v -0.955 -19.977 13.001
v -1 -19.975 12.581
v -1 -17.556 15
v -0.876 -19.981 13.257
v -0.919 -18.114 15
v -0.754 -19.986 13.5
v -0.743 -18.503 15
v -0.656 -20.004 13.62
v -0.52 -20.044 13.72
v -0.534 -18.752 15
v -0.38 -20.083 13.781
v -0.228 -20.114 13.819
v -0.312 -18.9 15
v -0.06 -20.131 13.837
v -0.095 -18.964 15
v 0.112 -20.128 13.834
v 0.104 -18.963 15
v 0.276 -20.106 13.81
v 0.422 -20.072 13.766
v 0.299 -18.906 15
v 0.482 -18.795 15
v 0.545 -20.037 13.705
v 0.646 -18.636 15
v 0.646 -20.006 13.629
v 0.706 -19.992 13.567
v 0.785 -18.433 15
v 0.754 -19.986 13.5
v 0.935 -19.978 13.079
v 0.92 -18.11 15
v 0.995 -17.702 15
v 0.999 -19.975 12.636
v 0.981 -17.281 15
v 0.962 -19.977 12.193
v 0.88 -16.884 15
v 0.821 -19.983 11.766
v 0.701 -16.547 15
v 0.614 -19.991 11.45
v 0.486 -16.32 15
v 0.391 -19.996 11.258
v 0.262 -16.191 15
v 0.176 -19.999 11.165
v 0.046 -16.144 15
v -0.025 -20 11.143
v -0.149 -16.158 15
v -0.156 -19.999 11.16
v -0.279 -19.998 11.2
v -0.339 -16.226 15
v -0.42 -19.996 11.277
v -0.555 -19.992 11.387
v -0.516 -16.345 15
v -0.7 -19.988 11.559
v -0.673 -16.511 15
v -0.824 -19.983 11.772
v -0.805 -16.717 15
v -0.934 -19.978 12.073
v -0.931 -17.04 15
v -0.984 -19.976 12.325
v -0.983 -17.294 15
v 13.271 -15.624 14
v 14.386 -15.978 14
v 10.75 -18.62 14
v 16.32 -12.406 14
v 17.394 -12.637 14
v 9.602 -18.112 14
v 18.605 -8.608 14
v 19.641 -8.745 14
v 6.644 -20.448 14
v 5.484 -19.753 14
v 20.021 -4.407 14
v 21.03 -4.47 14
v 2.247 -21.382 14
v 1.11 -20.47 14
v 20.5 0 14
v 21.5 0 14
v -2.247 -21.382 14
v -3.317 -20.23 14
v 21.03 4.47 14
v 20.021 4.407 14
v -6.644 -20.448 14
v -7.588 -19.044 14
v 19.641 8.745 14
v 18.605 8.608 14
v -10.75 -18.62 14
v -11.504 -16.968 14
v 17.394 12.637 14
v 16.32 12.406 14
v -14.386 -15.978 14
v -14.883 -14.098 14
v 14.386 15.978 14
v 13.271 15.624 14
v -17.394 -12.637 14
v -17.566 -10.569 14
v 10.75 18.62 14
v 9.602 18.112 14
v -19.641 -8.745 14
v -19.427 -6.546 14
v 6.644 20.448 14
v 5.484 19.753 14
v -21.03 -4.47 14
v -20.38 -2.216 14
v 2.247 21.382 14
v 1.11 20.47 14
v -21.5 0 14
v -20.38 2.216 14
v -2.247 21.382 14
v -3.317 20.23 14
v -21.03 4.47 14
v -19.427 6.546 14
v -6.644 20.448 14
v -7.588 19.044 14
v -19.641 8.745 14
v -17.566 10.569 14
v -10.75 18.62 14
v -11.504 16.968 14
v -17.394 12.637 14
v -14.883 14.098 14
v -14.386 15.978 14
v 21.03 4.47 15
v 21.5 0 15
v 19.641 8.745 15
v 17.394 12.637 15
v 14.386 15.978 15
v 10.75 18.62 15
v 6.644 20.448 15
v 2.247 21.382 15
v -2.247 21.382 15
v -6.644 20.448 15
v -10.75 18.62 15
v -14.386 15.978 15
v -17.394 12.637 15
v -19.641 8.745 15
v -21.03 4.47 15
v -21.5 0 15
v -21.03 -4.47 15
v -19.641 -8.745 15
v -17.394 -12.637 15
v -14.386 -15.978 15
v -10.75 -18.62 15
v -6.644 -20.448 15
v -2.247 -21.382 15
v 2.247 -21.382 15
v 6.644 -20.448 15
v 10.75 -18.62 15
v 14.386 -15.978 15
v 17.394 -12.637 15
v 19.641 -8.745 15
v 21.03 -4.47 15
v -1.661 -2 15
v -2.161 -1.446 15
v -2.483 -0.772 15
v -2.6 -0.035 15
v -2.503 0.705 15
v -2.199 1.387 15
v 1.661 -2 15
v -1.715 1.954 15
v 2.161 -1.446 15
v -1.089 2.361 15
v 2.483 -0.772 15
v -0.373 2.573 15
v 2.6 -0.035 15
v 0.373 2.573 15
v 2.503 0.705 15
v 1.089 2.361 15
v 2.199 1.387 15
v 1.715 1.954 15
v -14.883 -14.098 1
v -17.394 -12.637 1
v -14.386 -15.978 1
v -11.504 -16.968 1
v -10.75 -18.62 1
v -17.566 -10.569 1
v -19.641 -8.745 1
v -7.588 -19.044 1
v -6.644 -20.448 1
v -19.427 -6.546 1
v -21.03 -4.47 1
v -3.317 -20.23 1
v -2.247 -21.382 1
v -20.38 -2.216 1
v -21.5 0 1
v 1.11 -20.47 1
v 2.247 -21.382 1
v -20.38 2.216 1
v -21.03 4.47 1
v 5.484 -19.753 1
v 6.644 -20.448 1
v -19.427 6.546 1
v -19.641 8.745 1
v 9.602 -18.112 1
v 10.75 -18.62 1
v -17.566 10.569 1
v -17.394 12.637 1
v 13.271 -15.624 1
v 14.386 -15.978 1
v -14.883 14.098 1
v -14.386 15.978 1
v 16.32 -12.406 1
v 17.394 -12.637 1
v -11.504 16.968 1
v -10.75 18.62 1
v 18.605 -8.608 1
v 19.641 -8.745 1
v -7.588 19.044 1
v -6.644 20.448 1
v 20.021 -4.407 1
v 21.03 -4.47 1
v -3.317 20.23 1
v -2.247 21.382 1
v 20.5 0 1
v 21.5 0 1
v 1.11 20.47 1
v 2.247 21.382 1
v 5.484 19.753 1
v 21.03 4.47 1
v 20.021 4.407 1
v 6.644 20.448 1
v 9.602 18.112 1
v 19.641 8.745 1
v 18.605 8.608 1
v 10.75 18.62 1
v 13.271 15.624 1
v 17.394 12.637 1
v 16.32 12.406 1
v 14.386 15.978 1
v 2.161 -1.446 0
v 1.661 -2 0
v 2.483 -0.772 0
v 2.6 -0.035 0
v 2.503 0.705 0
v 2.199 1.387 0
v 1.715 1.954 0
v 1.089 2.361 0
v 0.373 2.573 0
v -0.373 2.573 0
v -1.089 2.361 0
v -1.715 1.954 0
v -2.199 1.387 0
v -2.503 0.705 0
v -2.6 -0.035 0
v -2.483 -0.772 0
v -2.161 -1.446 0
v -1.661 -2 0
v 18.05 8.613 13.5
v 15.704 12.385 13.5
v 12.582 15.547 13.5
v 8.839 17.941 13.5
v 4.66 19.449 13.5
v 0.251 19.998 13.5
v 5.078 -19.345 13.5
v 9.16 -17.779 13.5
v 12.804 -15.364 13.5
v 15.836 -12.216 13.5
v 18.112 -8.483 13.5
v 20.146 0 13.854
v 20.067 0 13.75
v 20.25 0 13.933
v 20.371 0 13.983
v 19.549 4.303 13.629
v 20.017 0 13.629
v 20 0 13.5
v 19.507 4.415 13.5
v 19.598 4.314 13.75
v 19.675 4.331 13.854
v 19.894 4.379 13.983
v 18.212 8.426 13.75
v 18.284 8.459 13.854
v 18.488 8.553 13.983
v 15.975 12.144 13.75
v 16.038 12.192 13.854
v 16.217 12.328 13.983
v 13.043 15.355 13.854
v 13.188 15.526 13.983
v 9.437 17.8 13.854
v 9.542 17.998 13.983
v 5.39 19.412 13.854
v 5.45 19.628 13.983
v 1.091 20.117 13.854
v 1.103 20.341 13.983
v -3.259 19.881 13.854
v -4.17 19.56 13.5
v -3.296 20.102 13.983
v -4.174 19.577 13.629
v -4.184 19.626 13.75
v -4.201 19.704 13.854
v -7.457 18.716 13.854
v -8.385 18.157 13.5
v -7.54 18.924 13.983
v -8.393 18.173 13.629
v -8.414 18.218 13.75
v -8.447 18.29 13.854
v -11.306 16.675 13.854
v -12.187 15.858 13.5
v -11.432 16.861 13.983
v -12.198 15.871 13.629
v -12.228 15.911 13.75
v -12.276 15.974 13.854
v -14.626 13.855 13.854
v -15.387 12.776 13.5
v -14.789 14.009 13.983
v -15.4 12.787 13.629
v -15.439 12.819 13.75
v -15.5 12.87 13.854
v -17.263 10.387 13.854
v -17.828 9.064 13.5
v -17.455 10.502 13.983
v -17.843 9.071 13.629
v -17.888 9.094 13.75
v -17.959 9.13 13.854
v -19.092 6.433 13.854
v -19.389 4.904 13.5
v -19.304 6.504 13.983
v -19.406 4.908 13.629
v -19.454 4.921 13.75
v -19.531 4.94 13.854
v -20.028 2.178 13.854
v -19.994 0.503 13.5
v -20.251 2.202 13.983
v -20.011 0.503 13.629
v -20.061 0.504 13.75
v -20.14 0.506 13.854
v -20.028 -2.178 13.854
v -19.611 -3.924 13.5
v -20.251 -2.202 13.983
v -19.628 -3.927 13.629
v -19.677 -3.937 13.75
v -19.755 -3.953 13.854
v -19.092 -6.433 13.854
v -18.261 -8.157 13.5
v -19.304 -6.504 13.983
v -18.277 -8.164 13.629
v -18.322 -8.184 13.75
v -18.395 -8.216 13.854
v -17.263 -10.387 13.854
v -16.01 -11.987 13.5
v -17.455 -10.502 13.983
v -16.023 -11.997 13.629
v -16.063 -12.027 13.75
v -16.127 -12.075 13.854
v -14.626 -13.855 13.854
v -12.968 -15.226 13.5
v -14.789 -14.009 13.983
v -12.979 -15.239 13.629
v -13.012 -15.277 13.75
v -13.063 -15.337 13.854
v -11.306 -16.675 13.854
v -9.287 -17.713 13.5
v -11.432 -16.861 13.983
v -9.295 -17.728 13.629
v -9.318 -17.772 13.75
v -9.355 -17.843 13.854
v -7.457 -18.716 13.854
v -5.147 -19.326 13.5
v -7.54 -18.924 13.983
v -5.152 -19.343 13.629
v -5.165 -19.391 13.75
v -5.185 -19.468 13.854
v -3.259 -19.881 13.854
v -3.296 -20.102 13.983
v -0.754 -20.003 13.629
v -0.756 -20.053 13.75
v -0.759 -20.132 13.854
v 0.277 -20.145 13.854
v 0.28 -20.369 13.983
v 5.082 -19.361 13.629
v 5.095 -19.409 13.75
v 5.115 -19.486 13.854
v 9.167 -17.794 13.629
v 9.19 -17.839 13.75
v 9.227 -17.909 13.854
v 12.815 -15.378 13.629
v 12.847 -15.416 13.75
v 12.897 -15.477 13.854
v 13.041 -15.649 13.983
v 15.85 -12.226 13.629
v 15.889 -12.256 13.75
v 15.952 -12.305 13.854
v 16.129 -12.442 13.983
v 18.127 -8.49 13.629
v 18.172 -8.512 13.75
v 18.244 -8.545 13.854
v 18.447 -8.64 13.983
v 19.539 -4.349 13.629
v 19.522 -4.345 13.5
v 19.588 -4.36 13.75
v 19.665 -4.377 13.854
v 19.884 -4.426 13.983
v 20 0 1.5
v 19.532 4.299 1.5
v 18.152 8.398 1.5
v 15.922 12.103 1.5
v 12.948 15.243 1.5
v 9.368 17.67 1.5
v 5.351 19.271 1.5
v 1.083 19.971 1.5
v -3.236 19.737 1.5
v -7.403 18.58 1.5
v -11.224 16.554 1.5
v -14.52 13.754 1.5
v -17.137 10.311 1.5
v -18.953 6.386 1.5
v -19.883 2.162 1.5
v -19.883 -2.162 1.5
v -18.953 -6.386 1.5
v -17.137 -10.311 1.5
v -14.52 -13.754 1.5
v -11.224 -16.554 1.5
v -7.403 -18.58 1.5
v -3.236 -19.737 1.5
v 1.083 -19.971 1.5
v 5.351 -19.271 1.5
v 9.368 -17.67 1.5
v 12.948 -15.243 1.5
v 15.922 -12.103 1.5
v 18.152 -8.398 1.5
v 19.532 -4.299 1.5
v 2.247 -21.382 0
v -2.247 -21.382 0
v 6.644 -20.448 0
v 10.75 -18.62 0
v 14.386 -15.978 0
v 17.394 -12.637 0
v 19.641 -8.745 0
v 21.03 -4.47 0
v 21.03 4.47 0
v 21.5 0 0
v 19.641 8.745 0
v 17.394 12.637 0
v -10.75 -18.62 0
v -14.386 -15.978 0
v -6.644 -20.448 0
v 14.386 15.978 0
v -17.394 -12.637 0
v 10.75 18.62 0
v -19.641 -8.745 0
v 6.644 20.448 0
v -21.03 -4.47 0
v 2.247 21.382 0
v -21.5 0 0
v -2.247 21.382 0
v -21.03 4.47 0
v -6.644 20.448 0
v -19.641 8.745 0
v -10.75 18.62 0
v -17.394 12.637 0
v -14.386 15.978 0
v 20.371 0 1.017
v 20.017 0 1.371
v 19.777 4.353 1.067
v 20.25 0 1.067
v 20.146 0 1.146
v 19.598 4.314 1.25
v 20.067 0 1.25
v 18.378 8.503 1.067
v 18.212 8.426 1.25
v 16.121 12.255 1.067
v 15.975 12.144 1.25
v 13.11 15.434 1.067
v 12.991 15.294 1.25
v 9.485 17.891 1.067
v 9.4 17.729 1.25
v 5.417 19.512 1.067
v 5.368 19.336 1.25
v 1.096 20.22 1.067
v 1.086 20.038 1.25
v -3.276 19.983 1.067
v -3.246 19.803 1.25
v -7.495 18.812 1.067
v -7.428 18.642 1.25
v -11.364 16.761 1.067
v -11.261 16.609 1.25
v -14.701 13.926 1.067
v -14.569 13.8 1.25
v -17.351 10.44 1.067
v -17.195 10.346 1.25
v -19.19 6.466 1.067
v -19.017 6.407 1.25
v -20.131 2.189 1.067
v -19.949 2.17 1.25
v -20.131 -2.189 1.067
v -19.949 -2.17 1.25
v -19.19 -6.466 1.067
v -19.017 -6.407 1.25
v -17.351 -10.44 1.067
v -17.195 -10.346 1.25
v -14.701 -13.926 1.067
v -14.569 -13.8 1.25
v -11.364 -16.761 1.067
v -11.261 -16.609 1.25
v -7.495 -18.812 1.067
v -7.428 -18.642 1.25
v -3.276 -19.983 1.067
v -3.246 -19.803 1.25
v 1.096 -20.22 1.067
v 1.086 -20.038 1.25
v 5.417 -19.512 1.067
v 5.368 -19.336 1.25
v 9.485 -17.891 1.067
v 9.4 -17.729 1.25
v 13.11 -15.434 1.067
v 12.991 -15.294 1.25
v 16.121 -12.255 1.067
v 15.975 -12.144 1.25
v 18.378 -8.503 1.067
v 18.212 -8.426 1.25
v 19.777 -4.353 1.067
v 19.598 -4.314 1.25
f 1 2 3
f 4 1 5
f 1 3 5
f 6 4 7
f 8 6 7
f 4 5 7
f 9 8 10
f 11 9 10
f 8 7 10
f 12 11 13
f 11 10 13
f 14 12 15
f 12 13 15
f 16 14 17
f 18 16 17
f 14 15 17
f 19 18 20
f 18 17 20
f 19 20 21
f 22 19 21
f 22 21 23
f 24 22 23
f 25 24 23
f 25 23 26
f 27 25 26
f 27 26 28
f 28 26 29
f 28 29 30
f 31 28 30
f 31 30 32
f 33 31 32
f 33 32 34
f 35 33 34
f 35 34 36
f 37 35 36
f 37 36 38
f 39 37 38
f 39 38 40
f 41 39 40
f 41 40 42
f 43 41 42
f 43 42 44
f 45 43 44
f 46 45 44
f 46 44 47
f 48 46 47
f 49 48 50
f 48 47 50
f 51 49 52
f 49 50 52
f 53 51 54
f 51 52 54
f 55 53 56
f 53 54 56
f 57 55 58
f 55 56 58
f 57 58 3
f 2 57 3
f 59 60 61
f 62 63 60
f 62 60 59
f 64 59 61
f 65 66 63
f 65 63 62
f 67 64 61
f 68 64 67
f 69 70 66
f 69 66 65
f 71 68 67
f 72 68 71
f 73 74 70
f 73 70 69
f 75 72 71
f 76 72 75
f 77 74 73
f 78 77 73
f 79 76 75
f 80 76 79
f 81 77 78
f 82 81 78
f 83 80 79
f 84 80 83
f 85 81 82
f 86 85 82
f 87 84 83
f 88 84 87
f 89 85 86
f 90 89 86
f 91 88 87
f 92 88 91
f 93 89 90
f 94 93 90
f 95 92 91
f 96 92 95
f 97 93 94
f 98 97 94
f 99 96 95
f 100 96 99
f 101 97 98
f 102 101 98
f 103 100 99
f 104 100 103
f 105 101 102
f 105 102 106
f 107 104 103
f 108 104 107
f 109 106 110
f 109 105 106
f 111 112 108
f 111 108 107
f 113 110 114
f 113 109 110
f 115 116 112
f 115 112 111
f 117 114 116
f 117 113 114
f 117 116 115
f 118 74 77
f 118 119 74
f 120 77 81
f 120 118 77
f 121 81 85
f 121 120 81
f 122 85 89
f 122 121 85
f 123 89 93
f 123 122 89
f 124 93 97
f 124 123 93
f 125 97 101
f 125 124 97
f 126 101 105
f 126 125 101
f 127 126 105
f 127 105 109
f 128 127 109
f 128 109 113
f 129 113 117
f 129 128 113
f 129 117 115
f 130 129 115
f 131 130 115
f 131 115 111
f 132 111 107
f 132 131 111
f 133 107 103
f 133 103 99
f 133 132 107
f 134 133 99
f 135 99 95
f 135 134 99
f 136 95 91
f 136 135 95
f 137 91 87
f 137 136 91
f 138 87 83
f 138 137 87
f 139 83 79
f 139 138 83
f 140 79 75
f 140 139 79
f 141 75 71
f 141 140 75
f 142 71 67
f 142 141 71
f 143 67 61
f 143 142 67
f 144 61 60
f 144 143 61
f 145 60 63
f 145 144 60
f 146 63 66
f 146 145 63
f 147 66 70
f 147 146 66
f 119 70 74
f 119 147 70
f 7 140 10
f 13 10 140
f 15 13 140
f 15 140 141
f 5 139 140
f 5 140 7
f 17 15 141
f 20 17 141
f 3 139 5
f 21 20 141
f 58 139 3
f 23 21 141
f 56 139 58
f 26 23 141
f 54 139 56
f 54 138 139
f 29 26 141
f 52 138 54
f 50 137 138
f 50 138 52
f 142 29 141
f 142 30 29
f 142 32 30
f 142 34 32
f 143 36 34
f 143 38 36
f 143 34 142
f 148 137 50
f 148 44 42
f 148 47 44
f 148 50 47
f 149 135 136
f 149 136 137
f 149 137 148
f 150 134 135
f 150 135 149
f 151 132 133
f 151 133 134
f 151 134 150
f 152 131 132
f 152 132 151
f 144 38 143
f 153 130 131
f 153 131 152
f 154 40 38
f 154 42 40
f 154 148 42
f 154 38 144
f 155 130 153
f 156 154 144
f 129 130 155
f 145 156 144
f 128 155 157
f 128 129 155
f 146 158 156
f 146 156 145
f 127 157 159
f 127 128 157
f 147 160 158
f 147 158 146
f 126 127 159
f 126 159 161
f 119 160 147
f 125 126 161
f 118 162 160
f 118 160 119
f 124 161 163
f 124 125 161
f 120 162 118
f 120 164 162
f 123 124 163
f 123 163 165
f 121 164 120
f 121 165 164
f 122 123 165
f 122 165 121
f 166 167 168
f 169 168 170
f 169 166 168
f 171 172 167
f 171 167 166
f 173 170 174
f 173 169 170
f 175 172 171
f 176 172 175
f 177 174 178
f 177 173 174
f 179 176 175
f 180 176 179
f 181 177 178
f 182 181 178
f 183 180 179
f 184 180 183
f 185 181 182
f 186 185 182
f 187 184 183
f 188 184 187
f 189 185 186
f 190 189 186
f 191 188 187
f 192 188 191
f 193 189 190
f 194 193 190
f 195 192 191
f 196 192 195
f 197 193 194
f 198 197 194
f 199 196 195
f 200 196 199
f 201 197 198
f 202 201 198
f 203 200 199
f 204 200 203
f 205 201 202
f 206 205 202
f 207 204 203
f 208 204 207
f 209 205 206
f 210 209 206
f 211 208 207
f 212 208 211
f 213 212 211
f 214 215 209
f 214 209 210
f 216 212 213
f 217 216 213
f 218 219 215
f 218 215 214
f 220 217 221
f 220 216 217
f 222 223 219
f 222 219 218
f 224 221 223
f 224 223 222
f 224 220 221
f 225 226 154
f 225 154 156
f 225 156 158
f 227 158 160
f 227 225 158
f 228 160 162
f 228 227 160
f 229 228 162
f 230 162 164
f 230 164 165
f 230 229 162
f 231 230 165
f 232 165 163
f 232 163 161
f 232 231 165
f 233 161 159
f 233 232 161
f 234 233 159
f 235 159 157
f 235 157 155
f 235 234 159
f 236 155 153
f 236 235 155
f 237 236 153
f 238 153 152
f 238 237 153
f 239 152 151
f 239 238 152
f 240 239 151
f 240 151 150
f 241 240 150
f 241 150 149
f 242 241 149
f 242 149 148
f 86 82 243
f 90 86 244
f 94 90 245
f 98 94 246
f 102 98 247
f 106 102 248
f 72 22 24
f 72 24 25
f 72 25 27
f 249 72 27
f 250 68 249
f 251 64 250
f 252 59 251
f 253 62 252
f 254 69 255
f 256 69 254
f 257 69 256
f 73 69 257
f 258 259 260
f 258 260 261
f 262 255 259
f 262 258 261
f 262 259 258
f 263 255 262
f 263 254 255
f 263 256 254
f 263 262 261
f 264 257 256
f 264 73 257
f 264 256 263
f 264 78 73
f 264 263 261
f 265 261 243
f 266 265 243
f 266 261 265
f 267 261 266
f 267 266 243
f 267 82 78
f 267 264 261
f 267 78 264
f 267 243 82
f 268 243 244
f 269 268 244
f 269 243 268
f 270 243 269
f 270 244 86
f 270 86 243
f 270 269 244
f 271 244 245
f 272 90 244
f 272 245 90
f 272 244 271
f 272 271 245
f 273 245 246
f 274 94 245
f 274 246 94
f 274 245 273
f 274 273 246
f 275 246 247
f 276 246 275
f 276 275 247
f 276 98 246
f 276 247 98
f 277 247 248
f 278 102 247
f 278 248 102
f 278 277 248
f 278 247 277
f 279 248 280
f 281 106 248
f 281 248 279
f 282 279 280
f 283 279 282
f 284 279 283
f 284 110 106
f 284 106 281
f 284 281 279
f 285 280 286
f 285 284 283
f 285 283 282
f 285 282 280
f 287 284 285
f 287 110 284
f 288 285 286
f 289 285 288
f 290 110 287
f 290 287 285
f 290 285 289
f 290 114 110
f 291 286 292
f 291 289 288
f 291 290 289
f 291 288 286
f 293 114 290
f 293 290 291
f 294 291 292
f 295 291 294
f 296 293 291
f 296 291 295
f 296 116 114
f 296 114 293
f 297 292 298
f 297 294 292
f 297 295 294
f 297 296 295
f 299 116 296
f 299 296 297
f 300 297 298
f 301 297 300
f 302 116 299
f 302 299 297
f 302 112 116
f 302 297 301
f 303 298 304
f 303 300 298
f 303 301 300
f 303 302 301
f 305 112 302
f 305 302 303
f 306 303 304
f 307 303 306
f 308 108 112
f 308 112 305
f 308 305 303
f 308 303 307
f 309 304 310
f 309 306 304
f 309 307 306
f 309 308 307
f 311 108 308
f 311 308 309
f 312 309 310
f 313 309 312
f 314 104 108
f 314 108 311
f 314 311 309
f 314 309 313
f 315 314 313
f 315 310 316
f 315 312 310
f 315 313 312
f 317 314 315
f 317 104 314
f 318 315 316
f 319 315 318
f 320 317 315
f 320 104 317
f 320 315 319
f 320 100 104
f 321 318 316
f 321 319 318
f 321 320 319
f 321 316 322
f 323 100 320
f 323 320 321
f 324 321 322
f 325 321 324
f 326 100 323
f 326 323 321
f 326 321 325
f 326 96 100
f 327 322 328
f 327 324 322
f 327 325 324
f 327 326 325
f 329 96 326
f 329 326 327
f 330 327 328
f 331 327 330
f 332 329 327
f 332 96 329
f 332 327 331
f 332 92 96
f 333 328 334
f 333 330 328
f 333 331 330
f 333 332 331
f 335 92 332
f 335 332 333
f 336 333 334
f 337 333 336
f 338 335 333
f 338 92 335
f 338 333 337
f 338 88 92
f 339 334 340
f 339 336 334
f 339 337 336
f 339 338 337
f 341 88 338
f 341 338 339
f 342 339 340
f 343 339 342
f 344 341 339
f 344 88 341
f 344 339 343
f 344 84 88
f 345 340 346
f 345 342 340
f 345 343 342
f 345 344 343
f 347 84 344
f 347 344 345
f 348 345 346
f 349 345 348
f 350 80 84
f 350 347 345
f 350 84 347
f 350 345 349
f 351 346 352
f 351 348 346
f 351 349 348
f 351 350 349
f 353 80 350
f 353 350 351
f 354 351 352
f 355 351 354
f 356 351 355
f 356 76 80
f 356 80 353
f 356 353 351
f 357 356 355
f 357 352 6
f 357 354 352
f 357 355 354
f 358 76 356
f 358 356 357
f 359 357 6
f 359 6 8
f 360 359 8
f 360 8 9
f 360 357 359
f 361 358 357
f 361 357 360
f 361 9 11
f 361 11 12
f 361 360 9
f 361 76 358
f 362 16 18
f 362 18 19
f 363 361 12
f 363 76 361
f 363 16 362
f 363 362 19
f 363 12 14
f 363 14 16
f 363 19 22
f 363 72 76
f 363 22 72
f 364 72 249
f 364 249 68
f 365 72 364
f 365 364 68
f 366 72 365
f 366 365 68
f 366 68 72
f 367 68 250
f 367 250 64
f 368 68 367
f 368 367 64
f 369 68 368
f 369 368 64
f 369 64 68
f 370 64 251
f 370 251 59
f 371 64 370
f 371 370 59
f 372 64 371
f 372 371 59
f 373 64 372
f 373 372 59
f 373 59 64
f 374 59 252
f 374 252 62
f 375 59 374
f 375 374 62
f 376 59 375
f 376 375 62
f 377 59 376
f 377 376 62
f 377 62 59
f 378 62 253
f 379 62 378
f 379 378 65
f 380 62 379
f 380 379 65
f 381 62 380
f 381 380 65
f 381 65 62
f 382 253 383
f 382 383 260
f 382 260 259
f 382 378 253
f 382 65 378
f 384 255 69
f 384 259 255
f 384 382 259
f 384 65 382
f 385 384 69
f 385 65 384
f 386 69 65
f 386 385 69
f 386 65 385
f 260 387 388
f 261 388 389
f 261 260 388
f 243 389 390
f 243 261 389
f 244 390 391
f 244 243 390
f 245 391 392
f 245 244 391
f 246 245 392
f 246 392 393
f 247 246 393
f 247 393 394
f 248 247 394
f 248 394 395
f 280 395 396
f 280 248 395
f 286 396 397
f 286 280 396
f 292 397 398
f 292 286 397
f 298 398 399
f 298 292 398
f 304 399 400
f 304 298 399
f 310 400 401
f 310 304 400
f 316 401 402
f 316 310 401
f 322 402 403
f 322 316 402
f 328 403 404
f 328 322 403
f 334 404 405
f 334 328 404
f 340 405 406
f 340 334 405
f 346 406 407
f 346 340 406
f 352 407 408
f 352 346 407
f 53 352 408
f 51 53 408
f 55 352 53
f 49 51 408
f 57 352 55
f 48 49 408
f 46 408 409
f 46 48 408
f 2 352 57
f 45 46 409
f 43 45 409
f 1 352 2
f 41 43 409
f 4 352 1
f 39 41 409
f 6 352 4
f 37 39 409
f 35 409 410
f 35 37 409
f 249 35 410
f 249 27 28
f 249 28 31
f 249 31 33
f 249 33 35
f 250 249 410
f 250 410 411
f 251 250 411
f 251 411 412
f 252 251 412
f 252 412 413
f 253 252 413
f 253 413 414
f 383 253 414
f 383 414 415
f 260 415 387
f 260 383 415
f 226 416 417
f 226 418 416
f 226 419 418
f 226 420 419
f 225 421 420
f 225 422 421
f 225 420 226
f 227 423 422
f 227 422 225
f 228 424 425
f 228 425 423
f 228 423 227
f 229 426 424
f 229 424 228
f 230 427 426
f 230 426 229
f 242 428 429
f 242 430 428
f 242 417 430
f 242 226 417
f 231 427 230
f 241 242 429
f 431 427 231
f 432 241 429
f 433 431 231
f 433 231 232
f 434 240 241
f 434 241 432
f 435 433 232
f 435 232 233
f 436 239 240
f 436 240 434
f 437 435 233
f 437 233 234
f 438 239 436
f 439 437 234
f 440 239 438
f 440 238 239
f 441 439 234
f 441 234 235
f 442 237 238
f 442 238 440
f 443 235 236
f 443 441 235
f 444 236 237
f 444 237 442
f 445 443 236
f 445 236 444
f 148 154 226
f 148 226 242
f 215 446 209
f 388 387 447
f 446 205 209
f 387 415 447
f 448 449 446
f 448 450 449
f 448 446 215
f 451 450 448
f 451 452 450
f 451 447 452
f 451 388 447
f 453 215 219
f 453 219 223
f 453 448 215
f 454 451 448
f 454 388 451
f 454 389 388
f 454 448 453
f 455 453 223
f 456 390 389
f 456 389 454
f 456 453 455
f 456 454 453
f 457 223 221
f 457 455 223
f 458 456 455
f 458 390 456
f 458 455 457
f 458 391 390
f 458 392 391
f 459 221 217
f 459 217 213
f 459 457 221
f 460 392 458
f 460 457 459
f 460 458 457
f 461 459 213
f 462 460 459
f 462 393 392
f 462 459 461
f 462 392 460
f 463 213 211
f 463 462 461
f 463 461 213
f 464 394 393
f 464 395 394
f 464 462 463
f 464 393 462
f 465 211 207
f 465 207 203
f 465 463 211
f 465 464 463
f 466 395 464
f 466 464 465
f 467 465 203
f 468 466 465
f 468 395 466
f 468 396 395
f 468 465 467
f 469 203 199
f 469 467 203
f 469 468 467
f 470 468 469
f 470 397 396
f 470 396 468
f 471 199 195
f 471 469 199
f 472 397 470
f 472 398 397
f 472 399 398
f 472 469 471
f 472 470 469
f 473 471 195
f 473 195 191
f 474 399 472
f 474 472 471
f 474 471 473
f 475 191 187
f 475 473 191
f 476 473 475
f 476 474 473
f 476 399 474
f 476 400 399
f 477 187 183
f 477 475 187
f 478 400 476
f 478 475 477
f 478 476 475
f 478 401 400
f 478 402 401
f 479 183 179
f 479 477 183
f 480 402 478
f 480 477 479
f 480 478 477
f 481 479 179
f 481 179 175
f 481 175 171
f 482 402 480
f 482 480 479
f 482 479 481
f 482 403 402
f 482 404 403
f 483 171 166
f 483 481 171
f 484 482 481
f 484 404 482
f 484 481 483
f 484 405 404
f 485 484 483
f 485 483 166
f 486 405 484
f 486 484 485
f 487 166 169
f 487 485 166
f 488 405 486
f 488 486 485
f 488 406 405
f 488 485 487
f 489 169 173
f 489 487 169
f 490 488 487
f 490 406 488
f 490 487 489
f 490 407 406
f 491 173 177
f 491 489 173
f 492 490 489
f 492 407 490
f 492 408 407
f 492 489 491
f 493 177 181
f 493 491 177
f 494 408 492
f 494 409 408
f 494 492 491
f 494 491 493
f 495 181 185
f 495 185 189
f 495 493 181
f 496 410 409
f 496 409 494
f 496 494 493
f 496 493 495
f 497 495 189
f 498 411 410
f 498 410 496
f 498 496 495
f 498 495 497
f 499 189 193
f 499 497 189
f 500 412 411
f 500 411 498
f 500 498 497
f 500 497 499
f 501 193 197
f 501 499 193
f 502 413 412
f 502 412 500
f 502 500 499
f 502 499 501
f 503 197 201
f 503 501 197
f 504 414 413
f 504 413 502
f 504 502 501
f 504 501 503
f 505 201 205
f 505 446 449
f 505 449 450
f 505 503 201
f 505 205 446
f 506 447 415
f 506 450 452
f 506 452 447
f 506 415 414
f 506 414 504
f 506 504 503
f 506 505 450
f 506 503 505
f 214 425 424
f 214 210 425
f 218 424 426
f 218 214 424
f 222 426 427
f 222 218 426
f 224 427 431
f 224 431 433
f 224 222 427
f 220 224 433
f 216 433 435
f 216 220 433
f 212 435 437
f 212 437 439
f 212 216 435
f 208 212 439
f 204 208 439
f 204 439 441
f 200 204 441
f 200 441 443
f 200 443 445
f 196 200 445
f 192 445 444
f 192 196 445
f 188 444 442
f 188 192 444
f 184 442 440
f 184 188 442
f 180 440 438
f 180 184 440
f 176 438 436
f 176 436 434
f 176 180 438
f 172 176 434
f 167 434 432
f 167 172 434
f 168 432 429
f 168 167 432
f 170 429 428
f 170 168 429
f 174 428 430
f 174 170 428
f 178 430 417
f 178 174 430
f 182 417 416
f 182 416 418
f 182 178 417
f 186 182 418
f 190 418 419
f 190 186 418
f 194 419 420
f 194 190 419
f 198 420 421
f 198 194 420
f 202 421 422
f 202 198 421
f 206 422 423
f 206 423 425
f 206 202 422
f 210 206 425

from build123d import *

# Parameters (mm, degrees)
F3_DEPTH = 15
F5_R     = 1
F6_DEPTH = 25


with BuildPart() as f1:
    # F0 (on Front) → F1 (revolve)
    with BuildSketch(Plane.XZ):
        with BuildLine():
            Line((2.6, 15), (2.6, 0))
            Line((2.6, 0), (21.5, 0))
            Line((21.5, 0), (21.5, 1))
            Line((21.5, 1), (20.5, 1))
            ThreePointArc((20.5, 1), (20.146447, 1.146447), (20, 1.5))
            Line((20, 1.5), (20, 13.5))
            ThreePointArc((20, 13.5), (20.146447, 13.853553), (20.5, 14))
            Line((20.5, 14), (21.5, 14))
            Line((21.5, 14), (21.5, 15))
            Line((21.5, 15), (2.6, 15))
        make_face()
    revolve(axis=Axis((0, 0, 3.375067), (0, 0, 1)))

    # F2 (on Top) → F3 (join, through all)
    with BuildSketch(Plane.XY):
        with BuildLine():
            Line((1.661325, -2), (-1.661325, -2))
            ThreePointArc((-1.661325, -2), (0, -2.6), (1.661325, -2))
        make_face()
    extrude(amount=F3_DEPTH)

    # F5 (on face) → F6 (cut)
    with BuildSketch(Plane(origin=(0, 6.5, 6.5), x_dir=(-1, 0, 0), z_dir=(0, 0.707107, 0.707107))):
        with Locations((0, 23.020815)):
            Circle(F5_R)
    extrude(amount=-F6_DEPTH, mode=Mode.SUBTRACT)


solid = f1.part
